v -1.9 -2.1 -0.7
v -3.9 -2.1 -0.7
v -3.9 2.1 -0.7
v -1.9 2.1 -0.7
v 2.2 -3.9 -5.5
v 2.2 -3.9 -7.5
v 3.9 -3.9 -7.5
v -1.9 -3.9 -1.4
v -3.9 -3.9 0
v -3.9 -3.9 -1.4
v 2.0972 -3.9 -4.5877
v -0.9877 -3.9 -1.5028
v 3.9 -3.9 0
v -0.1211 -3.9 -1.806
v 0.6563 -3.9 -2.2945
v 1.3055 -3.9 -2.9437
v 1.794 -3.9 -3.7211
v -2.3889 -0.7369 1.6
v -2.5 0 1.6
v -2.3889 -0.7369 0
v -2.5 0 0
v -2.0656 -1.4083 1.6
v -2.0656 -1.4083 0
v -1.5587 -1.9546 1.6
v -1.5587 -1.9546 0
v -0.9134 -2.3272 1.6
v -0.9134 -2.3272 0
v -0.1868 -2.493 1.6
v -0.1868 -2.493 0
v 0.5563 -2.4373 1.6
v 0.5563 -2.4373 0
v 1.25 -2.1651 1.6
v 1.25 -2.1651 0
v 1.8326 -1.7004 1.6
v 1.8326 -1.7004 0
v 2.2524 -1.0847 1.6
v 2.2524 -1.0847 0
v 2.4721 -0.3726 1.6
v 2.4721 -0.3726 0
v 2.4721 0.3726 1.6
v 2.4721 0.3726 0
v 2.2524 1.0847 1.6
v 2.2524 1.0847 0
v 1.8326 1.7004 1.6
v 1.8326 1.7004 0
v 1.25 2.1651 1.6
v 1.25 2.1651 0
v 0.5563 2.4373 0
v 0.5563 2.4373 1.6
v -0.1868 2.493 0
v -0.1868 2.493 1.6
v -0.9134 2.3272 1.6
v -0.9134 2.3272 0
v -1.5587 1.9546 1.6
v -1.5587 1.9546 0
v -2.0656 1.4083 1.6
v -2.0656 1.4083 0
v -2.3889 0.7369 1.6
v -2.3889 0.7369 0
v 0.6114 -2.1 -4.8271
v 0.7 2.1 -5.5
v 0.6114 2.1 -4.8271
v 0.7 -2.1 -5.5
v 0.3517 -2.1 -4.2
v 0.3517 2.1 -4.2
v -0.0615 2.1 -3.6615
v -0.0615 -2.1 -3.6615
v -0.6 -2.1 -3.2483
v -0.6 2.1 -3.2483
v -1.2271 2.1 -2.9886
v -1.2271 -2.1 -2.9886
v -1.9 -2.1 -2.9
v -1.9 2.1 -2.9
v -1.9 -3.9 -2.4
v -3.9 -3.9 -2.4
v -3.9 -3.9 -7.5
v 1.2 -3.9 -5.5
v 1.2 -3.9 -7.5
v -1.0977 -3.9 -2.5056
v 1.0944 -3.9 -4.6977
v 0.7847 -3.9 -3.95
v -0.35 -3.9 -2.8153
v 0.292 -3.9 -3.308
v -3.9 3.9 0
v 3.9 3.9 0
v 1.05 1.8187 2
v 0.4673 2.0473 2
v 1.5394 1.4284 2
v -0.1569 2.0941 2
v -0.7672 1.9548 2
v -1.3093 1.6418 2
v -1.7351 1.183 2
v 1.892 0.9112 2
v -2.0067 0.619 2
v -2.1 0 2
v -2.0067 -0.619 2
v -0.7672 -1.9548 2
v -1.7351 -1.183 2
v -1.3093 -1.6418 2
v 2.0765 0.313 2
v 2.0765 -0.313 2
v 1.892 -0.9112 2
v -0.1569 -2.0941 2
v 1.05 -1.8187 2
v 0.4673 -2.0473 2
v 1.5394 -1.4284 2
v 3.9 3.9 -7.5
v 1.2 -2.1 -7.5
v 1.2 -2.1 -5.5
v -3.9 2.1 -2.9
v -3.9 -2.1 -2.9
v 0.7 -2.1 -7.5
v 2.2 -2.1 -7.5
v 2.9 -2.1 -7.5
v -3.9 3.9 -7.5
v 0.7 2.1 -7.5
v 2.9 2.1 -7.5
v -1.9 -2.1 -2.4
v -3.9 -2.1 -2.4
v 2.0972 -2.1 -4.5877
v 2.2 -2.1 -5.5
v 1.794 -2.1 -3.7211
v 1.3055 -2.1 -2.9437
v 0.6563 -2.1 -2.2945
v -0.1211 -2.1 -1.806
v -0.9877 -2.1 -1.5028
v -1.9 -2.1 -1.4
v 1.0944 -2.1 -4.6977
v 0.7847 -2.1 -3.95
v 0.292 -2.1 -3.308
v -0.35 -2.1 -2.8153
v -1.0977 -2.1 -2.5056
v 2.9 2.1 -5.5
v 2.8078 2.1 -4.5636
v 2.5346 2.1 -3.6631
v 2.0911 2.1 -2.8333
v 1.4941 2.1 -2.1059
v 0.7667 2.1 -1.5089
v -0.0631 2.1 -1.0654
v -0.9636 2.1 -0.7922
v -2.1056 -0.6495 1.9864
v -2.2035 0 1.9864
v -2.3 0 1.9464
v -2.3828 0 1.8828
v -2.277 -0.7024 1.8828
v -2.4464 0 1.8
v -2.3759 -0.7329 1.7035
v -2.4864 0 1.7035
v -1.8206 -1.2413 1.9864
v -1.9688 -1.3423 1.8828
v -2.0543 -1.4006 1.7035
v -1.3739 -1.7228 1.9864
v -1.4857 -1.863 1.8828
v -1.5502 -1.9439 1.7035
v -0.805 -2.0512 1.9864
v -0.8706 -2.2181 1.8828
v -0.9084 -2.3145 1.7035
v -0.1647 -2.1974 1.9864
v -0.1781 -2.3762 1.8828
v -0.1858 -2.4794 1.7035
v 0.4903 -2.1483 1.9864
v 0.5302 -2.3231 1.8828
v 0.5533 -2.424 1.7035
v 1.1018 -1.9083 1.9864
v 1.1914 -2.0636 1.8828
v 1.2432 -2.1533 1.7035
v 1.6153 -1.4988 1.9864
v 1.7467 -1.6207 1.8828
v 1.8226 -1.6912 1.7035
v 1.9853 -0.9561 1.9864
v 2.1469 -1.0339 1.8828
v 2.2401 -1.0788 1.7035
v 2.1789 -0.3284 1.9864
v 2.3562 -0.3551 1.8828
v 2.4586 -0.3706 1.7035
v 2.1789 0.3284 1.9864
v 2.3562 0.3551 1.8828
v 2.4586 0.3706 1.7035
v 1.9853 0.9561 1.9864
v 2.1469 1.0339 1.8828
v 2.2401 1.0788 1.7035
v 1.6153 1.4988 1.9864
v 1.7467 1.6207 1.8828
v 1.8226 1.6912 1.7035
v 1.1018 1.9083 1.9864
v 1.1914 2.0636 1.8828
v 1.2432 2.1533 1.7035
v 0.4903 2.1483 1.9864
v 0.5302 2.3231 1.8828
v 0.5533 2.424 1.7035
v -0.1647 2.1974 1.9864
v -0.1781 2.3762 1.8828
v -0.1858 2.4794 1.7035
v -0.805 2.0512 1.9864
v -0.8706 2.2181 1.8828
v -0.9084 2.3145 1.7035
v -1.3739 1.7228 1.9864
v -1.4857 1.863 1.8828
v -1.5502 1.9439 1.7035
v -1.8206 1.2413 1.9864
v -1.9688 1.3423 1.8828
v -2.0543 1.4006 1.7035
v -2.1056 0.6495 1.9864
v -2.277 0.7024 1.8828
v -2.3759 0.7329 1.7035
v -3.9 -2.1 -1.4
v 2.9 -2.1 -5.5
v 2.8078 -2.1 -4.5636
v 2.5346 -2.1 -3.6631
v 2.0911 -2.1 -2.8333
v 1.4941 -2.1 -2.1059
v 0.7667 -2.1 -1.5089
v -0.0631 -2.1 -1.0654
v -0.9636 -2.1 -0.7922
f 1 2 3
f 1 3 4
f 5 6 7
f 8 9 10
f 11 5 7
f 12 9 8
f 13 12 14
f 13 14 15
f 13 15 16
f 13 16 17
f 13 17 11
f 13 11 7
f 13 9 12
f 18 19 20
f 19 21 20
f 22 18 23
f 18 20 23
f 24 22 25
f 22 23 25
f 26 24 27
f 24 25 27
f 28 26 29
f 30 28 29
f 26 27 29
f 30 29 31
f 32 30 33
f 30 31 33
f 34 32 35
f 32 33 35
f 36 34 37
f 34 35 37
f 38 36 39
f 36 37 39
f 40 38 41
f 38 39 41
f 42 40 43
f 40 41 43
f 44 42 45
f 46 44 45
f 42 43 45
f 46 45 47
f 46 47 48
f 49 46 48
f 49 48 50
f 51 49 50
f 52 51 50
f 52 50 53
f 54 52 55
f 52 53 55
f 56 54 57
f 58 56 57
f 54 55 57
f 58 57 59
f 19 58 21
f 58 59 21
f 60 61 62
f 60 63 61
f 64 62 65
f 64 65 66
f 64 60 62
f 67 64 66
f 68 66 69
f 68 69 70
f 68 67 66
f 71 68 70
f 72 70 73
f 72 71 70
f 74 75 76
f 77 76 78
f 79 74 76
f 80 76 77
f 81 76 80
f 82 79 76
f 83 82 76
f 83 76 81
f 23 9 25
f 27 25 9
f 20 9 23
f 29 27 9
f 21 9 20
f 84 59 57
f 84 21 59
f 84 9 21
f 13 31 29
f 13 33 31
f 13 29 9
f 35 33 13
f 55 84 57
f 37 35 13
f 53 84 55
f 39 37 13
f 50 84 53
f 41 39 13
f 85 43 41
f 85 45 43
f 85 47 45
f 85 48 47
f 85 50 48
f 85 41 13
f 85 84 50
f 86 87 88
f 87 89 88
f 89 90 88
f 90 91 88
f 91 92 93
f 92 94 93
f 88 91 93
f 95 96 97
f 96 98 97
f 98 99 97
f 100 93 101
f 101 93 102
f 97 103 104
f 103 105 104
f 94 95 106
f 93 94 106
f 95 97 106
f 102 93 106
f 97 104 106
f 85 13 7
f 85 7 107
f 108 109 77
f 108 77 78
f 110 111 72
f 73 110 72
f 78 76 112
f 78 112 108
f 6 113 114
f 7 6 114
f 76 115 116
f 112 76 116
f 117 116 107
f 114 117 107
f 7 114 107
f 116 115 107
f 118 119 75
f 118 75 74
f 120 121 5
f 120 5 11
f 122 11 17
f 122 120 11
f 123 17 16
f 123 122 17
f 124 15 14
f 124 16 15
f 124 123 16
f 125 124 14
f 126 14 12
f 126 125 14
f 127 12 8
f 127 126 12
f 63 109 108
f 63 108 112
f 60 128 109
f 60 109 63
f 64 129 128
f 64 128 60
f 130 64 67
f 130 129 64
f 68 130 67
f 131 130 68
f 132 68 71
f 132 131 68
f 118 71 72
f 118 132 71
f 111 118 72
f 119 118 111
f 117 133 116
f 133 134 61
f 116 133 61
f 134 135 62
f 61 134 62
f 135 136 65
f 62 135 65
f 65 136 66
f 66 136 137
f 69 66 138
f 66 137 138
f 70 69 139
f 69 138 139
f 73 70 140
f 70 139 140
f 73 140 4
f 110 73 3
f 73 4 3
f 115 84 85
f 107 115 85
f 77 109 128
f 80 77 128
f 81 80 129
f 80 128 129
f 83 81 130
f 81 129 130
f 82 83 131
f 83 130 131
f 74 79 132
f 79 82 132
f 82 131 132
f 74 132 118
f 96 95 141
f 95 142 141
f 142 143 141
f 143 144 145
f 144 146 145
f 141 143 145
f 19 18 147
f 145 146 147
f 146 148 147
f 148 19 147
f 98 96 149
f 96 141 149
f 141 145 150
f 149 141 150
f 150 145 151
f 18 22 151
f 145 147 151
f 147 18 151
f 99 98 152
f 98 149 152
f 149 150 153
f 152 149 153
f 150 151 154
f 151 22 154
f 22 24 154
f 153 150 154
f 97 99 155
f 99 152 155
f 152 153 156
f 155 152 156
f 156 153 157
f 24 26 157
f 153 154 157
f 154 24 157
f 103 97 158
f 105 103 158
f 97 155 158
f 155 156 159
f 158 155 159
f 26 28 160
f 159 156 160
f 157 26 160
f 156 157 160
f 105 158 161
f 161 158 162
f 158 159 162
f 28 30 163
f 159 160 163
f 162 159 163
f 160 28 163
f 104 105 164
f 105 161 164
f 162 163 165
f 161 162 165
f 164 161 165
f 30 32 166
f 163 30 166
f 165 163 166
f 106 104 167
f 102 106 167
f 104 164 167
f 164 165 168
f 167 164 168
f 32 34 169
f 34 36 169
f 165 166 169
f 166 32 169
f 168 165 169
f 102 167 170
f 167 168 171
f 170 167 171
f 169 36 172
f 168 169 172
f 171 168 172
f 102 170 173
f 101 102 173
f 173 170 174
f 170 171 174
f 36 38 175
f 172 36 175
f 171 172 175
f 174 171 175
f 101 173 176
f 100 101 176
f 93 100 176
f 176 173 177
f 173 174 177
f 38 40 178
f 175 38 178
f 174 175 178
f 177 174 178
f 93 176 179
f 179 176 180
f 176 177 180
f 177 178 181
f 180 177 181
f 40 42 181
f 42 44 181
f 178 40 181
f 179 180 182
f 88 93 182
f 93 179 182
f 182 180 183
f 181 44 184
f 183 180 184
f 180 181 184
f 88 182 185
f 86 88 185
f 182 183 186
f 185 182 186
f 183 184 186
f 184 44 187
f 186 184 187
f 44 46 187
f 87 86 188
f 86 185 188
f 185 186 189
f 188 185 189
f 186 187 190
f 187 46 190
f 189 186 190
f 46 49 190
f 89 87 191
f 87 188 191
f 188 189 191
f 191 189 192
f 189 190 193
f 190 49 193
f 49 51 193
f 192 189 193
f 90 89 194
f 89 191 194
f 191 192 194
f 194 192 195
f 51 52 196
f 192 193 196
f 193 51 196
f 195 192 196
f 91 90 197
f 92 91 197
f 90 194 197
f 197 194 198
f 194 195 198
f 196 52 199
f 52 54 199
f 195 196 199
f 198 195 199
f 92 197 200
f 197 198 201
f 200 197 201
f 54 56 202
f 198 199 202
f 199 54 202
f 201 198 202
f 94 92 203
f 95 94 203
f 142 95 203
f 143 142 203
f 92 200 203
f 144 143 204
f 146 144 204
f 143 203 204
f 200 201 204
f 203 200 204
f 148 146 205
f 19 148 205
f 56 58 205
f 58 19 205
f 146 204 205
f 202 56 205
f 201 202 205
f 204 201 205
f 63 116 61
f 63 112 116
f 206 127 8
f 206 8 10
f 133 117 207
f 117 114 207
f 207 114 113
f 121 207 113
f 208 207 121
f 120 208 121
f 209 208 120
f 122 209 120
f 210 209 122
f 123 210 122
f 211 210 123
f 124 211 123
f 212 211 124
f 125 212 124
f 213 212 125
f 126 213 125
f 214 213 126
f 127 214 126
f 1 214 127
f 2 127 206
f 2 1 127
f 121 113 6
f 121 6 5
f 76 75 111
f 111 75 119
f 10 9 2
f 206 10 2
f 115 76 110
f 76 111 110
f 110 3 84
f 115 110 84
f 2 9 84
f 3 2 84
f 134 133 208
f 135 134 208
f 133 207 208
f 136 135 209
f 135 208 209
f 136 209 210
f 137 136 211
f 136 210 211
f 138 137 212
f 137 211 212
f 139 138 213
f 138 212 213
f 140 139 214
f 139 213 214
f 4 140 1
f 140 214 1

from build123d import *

# Parameters (mm, degrees)
SKETCH001_W     = 7.8
SKETCH001_H     = 7.8
PAD_DEPTH       = 7.5
POCKET_DEPTH    = 2.1
POCKET001_DEPTH = 5


with BuildPart() as part:
    # Sketch → Revolution (revolve)
    with BuildSketch(Plane.XZ):
        with BuildLine():
            Line((0, 0), (0, 2))
            Line((0, 2), (-2.1, 2))
            ThreePointArc((-2.1, 2), (-2.382843, 1.882843), (-2.5, 1.6))
            Line((-2.5, 1.6), (-2.5, 0))
            Line((-2.5, 0), (0, 0))
        make_face()
    revolve(axis=Axis((0, 0, 0), (0, 0, 1)))

    # Sketch001 → Pad (new body)
    with BuildSketch(Plane.XY):
        Rectangle(SKETCH001_W, SKETCH001_H)
    extrude(amount=-PAD_DEPTH)

    # Sketch002 → Pocket (cut, symmetric)
    with BuildSketch(Plane.XZ):
        with BuildLine():
            Line((-3.9, -0.7), (-1.9, -0.7))
            ThreePointArc((2.9, -5.5), (1.494113, -2.105887), (-1.9, -0.7))
            Line((2.9, -7.5), (2.9, -5.5))
            Line((0.7, -7.5), (2.9, -7.5))
            Line((0.7, -7.5), (0.7, -5.5))
            ThreePointArc((0.7, -5.5), (-0.061522, -3.661522), (-1.9, -2.9))
            Line((-3.9, -2.9), (-1.9, -2.9))
            Line((-3.9, -0.7), (-3.9, -2.9))
        make_face()
    extrude(amount=POCKET_DEPTH, both=True, mode=Mode.SUBTRACT)

    # Sketch003 → Pocket001 (cut)
    with BuildSketch(Plane.XZ):
        with BuildLine():
            Line((-1.9, -1.4), (-3.9, -1.4))
            Line((-3.9, -1.4), (-3.9, -2.4))
            Line((-3.9, -2.4), (-1.9, -2.4))
            ThreePointArc((1.2, -5.5), (0.292031, -3.307969), (-1.9, -2.4))
            Line((1.2, -5.5), (1.2, -7.5))
            Line((1.2, -7.5), (2.2, -7.5))
            Line((2.2, -7.5), (2.2, -5.5))
            ThreePointArc((2.2, -5.5), (0.999138, -2.600862), (-1.9, -1.4))
        make_face()
    extrude(amount=POCKET001_DEPTH, mode=Mode.SUBTRACT)


solid = part.part
